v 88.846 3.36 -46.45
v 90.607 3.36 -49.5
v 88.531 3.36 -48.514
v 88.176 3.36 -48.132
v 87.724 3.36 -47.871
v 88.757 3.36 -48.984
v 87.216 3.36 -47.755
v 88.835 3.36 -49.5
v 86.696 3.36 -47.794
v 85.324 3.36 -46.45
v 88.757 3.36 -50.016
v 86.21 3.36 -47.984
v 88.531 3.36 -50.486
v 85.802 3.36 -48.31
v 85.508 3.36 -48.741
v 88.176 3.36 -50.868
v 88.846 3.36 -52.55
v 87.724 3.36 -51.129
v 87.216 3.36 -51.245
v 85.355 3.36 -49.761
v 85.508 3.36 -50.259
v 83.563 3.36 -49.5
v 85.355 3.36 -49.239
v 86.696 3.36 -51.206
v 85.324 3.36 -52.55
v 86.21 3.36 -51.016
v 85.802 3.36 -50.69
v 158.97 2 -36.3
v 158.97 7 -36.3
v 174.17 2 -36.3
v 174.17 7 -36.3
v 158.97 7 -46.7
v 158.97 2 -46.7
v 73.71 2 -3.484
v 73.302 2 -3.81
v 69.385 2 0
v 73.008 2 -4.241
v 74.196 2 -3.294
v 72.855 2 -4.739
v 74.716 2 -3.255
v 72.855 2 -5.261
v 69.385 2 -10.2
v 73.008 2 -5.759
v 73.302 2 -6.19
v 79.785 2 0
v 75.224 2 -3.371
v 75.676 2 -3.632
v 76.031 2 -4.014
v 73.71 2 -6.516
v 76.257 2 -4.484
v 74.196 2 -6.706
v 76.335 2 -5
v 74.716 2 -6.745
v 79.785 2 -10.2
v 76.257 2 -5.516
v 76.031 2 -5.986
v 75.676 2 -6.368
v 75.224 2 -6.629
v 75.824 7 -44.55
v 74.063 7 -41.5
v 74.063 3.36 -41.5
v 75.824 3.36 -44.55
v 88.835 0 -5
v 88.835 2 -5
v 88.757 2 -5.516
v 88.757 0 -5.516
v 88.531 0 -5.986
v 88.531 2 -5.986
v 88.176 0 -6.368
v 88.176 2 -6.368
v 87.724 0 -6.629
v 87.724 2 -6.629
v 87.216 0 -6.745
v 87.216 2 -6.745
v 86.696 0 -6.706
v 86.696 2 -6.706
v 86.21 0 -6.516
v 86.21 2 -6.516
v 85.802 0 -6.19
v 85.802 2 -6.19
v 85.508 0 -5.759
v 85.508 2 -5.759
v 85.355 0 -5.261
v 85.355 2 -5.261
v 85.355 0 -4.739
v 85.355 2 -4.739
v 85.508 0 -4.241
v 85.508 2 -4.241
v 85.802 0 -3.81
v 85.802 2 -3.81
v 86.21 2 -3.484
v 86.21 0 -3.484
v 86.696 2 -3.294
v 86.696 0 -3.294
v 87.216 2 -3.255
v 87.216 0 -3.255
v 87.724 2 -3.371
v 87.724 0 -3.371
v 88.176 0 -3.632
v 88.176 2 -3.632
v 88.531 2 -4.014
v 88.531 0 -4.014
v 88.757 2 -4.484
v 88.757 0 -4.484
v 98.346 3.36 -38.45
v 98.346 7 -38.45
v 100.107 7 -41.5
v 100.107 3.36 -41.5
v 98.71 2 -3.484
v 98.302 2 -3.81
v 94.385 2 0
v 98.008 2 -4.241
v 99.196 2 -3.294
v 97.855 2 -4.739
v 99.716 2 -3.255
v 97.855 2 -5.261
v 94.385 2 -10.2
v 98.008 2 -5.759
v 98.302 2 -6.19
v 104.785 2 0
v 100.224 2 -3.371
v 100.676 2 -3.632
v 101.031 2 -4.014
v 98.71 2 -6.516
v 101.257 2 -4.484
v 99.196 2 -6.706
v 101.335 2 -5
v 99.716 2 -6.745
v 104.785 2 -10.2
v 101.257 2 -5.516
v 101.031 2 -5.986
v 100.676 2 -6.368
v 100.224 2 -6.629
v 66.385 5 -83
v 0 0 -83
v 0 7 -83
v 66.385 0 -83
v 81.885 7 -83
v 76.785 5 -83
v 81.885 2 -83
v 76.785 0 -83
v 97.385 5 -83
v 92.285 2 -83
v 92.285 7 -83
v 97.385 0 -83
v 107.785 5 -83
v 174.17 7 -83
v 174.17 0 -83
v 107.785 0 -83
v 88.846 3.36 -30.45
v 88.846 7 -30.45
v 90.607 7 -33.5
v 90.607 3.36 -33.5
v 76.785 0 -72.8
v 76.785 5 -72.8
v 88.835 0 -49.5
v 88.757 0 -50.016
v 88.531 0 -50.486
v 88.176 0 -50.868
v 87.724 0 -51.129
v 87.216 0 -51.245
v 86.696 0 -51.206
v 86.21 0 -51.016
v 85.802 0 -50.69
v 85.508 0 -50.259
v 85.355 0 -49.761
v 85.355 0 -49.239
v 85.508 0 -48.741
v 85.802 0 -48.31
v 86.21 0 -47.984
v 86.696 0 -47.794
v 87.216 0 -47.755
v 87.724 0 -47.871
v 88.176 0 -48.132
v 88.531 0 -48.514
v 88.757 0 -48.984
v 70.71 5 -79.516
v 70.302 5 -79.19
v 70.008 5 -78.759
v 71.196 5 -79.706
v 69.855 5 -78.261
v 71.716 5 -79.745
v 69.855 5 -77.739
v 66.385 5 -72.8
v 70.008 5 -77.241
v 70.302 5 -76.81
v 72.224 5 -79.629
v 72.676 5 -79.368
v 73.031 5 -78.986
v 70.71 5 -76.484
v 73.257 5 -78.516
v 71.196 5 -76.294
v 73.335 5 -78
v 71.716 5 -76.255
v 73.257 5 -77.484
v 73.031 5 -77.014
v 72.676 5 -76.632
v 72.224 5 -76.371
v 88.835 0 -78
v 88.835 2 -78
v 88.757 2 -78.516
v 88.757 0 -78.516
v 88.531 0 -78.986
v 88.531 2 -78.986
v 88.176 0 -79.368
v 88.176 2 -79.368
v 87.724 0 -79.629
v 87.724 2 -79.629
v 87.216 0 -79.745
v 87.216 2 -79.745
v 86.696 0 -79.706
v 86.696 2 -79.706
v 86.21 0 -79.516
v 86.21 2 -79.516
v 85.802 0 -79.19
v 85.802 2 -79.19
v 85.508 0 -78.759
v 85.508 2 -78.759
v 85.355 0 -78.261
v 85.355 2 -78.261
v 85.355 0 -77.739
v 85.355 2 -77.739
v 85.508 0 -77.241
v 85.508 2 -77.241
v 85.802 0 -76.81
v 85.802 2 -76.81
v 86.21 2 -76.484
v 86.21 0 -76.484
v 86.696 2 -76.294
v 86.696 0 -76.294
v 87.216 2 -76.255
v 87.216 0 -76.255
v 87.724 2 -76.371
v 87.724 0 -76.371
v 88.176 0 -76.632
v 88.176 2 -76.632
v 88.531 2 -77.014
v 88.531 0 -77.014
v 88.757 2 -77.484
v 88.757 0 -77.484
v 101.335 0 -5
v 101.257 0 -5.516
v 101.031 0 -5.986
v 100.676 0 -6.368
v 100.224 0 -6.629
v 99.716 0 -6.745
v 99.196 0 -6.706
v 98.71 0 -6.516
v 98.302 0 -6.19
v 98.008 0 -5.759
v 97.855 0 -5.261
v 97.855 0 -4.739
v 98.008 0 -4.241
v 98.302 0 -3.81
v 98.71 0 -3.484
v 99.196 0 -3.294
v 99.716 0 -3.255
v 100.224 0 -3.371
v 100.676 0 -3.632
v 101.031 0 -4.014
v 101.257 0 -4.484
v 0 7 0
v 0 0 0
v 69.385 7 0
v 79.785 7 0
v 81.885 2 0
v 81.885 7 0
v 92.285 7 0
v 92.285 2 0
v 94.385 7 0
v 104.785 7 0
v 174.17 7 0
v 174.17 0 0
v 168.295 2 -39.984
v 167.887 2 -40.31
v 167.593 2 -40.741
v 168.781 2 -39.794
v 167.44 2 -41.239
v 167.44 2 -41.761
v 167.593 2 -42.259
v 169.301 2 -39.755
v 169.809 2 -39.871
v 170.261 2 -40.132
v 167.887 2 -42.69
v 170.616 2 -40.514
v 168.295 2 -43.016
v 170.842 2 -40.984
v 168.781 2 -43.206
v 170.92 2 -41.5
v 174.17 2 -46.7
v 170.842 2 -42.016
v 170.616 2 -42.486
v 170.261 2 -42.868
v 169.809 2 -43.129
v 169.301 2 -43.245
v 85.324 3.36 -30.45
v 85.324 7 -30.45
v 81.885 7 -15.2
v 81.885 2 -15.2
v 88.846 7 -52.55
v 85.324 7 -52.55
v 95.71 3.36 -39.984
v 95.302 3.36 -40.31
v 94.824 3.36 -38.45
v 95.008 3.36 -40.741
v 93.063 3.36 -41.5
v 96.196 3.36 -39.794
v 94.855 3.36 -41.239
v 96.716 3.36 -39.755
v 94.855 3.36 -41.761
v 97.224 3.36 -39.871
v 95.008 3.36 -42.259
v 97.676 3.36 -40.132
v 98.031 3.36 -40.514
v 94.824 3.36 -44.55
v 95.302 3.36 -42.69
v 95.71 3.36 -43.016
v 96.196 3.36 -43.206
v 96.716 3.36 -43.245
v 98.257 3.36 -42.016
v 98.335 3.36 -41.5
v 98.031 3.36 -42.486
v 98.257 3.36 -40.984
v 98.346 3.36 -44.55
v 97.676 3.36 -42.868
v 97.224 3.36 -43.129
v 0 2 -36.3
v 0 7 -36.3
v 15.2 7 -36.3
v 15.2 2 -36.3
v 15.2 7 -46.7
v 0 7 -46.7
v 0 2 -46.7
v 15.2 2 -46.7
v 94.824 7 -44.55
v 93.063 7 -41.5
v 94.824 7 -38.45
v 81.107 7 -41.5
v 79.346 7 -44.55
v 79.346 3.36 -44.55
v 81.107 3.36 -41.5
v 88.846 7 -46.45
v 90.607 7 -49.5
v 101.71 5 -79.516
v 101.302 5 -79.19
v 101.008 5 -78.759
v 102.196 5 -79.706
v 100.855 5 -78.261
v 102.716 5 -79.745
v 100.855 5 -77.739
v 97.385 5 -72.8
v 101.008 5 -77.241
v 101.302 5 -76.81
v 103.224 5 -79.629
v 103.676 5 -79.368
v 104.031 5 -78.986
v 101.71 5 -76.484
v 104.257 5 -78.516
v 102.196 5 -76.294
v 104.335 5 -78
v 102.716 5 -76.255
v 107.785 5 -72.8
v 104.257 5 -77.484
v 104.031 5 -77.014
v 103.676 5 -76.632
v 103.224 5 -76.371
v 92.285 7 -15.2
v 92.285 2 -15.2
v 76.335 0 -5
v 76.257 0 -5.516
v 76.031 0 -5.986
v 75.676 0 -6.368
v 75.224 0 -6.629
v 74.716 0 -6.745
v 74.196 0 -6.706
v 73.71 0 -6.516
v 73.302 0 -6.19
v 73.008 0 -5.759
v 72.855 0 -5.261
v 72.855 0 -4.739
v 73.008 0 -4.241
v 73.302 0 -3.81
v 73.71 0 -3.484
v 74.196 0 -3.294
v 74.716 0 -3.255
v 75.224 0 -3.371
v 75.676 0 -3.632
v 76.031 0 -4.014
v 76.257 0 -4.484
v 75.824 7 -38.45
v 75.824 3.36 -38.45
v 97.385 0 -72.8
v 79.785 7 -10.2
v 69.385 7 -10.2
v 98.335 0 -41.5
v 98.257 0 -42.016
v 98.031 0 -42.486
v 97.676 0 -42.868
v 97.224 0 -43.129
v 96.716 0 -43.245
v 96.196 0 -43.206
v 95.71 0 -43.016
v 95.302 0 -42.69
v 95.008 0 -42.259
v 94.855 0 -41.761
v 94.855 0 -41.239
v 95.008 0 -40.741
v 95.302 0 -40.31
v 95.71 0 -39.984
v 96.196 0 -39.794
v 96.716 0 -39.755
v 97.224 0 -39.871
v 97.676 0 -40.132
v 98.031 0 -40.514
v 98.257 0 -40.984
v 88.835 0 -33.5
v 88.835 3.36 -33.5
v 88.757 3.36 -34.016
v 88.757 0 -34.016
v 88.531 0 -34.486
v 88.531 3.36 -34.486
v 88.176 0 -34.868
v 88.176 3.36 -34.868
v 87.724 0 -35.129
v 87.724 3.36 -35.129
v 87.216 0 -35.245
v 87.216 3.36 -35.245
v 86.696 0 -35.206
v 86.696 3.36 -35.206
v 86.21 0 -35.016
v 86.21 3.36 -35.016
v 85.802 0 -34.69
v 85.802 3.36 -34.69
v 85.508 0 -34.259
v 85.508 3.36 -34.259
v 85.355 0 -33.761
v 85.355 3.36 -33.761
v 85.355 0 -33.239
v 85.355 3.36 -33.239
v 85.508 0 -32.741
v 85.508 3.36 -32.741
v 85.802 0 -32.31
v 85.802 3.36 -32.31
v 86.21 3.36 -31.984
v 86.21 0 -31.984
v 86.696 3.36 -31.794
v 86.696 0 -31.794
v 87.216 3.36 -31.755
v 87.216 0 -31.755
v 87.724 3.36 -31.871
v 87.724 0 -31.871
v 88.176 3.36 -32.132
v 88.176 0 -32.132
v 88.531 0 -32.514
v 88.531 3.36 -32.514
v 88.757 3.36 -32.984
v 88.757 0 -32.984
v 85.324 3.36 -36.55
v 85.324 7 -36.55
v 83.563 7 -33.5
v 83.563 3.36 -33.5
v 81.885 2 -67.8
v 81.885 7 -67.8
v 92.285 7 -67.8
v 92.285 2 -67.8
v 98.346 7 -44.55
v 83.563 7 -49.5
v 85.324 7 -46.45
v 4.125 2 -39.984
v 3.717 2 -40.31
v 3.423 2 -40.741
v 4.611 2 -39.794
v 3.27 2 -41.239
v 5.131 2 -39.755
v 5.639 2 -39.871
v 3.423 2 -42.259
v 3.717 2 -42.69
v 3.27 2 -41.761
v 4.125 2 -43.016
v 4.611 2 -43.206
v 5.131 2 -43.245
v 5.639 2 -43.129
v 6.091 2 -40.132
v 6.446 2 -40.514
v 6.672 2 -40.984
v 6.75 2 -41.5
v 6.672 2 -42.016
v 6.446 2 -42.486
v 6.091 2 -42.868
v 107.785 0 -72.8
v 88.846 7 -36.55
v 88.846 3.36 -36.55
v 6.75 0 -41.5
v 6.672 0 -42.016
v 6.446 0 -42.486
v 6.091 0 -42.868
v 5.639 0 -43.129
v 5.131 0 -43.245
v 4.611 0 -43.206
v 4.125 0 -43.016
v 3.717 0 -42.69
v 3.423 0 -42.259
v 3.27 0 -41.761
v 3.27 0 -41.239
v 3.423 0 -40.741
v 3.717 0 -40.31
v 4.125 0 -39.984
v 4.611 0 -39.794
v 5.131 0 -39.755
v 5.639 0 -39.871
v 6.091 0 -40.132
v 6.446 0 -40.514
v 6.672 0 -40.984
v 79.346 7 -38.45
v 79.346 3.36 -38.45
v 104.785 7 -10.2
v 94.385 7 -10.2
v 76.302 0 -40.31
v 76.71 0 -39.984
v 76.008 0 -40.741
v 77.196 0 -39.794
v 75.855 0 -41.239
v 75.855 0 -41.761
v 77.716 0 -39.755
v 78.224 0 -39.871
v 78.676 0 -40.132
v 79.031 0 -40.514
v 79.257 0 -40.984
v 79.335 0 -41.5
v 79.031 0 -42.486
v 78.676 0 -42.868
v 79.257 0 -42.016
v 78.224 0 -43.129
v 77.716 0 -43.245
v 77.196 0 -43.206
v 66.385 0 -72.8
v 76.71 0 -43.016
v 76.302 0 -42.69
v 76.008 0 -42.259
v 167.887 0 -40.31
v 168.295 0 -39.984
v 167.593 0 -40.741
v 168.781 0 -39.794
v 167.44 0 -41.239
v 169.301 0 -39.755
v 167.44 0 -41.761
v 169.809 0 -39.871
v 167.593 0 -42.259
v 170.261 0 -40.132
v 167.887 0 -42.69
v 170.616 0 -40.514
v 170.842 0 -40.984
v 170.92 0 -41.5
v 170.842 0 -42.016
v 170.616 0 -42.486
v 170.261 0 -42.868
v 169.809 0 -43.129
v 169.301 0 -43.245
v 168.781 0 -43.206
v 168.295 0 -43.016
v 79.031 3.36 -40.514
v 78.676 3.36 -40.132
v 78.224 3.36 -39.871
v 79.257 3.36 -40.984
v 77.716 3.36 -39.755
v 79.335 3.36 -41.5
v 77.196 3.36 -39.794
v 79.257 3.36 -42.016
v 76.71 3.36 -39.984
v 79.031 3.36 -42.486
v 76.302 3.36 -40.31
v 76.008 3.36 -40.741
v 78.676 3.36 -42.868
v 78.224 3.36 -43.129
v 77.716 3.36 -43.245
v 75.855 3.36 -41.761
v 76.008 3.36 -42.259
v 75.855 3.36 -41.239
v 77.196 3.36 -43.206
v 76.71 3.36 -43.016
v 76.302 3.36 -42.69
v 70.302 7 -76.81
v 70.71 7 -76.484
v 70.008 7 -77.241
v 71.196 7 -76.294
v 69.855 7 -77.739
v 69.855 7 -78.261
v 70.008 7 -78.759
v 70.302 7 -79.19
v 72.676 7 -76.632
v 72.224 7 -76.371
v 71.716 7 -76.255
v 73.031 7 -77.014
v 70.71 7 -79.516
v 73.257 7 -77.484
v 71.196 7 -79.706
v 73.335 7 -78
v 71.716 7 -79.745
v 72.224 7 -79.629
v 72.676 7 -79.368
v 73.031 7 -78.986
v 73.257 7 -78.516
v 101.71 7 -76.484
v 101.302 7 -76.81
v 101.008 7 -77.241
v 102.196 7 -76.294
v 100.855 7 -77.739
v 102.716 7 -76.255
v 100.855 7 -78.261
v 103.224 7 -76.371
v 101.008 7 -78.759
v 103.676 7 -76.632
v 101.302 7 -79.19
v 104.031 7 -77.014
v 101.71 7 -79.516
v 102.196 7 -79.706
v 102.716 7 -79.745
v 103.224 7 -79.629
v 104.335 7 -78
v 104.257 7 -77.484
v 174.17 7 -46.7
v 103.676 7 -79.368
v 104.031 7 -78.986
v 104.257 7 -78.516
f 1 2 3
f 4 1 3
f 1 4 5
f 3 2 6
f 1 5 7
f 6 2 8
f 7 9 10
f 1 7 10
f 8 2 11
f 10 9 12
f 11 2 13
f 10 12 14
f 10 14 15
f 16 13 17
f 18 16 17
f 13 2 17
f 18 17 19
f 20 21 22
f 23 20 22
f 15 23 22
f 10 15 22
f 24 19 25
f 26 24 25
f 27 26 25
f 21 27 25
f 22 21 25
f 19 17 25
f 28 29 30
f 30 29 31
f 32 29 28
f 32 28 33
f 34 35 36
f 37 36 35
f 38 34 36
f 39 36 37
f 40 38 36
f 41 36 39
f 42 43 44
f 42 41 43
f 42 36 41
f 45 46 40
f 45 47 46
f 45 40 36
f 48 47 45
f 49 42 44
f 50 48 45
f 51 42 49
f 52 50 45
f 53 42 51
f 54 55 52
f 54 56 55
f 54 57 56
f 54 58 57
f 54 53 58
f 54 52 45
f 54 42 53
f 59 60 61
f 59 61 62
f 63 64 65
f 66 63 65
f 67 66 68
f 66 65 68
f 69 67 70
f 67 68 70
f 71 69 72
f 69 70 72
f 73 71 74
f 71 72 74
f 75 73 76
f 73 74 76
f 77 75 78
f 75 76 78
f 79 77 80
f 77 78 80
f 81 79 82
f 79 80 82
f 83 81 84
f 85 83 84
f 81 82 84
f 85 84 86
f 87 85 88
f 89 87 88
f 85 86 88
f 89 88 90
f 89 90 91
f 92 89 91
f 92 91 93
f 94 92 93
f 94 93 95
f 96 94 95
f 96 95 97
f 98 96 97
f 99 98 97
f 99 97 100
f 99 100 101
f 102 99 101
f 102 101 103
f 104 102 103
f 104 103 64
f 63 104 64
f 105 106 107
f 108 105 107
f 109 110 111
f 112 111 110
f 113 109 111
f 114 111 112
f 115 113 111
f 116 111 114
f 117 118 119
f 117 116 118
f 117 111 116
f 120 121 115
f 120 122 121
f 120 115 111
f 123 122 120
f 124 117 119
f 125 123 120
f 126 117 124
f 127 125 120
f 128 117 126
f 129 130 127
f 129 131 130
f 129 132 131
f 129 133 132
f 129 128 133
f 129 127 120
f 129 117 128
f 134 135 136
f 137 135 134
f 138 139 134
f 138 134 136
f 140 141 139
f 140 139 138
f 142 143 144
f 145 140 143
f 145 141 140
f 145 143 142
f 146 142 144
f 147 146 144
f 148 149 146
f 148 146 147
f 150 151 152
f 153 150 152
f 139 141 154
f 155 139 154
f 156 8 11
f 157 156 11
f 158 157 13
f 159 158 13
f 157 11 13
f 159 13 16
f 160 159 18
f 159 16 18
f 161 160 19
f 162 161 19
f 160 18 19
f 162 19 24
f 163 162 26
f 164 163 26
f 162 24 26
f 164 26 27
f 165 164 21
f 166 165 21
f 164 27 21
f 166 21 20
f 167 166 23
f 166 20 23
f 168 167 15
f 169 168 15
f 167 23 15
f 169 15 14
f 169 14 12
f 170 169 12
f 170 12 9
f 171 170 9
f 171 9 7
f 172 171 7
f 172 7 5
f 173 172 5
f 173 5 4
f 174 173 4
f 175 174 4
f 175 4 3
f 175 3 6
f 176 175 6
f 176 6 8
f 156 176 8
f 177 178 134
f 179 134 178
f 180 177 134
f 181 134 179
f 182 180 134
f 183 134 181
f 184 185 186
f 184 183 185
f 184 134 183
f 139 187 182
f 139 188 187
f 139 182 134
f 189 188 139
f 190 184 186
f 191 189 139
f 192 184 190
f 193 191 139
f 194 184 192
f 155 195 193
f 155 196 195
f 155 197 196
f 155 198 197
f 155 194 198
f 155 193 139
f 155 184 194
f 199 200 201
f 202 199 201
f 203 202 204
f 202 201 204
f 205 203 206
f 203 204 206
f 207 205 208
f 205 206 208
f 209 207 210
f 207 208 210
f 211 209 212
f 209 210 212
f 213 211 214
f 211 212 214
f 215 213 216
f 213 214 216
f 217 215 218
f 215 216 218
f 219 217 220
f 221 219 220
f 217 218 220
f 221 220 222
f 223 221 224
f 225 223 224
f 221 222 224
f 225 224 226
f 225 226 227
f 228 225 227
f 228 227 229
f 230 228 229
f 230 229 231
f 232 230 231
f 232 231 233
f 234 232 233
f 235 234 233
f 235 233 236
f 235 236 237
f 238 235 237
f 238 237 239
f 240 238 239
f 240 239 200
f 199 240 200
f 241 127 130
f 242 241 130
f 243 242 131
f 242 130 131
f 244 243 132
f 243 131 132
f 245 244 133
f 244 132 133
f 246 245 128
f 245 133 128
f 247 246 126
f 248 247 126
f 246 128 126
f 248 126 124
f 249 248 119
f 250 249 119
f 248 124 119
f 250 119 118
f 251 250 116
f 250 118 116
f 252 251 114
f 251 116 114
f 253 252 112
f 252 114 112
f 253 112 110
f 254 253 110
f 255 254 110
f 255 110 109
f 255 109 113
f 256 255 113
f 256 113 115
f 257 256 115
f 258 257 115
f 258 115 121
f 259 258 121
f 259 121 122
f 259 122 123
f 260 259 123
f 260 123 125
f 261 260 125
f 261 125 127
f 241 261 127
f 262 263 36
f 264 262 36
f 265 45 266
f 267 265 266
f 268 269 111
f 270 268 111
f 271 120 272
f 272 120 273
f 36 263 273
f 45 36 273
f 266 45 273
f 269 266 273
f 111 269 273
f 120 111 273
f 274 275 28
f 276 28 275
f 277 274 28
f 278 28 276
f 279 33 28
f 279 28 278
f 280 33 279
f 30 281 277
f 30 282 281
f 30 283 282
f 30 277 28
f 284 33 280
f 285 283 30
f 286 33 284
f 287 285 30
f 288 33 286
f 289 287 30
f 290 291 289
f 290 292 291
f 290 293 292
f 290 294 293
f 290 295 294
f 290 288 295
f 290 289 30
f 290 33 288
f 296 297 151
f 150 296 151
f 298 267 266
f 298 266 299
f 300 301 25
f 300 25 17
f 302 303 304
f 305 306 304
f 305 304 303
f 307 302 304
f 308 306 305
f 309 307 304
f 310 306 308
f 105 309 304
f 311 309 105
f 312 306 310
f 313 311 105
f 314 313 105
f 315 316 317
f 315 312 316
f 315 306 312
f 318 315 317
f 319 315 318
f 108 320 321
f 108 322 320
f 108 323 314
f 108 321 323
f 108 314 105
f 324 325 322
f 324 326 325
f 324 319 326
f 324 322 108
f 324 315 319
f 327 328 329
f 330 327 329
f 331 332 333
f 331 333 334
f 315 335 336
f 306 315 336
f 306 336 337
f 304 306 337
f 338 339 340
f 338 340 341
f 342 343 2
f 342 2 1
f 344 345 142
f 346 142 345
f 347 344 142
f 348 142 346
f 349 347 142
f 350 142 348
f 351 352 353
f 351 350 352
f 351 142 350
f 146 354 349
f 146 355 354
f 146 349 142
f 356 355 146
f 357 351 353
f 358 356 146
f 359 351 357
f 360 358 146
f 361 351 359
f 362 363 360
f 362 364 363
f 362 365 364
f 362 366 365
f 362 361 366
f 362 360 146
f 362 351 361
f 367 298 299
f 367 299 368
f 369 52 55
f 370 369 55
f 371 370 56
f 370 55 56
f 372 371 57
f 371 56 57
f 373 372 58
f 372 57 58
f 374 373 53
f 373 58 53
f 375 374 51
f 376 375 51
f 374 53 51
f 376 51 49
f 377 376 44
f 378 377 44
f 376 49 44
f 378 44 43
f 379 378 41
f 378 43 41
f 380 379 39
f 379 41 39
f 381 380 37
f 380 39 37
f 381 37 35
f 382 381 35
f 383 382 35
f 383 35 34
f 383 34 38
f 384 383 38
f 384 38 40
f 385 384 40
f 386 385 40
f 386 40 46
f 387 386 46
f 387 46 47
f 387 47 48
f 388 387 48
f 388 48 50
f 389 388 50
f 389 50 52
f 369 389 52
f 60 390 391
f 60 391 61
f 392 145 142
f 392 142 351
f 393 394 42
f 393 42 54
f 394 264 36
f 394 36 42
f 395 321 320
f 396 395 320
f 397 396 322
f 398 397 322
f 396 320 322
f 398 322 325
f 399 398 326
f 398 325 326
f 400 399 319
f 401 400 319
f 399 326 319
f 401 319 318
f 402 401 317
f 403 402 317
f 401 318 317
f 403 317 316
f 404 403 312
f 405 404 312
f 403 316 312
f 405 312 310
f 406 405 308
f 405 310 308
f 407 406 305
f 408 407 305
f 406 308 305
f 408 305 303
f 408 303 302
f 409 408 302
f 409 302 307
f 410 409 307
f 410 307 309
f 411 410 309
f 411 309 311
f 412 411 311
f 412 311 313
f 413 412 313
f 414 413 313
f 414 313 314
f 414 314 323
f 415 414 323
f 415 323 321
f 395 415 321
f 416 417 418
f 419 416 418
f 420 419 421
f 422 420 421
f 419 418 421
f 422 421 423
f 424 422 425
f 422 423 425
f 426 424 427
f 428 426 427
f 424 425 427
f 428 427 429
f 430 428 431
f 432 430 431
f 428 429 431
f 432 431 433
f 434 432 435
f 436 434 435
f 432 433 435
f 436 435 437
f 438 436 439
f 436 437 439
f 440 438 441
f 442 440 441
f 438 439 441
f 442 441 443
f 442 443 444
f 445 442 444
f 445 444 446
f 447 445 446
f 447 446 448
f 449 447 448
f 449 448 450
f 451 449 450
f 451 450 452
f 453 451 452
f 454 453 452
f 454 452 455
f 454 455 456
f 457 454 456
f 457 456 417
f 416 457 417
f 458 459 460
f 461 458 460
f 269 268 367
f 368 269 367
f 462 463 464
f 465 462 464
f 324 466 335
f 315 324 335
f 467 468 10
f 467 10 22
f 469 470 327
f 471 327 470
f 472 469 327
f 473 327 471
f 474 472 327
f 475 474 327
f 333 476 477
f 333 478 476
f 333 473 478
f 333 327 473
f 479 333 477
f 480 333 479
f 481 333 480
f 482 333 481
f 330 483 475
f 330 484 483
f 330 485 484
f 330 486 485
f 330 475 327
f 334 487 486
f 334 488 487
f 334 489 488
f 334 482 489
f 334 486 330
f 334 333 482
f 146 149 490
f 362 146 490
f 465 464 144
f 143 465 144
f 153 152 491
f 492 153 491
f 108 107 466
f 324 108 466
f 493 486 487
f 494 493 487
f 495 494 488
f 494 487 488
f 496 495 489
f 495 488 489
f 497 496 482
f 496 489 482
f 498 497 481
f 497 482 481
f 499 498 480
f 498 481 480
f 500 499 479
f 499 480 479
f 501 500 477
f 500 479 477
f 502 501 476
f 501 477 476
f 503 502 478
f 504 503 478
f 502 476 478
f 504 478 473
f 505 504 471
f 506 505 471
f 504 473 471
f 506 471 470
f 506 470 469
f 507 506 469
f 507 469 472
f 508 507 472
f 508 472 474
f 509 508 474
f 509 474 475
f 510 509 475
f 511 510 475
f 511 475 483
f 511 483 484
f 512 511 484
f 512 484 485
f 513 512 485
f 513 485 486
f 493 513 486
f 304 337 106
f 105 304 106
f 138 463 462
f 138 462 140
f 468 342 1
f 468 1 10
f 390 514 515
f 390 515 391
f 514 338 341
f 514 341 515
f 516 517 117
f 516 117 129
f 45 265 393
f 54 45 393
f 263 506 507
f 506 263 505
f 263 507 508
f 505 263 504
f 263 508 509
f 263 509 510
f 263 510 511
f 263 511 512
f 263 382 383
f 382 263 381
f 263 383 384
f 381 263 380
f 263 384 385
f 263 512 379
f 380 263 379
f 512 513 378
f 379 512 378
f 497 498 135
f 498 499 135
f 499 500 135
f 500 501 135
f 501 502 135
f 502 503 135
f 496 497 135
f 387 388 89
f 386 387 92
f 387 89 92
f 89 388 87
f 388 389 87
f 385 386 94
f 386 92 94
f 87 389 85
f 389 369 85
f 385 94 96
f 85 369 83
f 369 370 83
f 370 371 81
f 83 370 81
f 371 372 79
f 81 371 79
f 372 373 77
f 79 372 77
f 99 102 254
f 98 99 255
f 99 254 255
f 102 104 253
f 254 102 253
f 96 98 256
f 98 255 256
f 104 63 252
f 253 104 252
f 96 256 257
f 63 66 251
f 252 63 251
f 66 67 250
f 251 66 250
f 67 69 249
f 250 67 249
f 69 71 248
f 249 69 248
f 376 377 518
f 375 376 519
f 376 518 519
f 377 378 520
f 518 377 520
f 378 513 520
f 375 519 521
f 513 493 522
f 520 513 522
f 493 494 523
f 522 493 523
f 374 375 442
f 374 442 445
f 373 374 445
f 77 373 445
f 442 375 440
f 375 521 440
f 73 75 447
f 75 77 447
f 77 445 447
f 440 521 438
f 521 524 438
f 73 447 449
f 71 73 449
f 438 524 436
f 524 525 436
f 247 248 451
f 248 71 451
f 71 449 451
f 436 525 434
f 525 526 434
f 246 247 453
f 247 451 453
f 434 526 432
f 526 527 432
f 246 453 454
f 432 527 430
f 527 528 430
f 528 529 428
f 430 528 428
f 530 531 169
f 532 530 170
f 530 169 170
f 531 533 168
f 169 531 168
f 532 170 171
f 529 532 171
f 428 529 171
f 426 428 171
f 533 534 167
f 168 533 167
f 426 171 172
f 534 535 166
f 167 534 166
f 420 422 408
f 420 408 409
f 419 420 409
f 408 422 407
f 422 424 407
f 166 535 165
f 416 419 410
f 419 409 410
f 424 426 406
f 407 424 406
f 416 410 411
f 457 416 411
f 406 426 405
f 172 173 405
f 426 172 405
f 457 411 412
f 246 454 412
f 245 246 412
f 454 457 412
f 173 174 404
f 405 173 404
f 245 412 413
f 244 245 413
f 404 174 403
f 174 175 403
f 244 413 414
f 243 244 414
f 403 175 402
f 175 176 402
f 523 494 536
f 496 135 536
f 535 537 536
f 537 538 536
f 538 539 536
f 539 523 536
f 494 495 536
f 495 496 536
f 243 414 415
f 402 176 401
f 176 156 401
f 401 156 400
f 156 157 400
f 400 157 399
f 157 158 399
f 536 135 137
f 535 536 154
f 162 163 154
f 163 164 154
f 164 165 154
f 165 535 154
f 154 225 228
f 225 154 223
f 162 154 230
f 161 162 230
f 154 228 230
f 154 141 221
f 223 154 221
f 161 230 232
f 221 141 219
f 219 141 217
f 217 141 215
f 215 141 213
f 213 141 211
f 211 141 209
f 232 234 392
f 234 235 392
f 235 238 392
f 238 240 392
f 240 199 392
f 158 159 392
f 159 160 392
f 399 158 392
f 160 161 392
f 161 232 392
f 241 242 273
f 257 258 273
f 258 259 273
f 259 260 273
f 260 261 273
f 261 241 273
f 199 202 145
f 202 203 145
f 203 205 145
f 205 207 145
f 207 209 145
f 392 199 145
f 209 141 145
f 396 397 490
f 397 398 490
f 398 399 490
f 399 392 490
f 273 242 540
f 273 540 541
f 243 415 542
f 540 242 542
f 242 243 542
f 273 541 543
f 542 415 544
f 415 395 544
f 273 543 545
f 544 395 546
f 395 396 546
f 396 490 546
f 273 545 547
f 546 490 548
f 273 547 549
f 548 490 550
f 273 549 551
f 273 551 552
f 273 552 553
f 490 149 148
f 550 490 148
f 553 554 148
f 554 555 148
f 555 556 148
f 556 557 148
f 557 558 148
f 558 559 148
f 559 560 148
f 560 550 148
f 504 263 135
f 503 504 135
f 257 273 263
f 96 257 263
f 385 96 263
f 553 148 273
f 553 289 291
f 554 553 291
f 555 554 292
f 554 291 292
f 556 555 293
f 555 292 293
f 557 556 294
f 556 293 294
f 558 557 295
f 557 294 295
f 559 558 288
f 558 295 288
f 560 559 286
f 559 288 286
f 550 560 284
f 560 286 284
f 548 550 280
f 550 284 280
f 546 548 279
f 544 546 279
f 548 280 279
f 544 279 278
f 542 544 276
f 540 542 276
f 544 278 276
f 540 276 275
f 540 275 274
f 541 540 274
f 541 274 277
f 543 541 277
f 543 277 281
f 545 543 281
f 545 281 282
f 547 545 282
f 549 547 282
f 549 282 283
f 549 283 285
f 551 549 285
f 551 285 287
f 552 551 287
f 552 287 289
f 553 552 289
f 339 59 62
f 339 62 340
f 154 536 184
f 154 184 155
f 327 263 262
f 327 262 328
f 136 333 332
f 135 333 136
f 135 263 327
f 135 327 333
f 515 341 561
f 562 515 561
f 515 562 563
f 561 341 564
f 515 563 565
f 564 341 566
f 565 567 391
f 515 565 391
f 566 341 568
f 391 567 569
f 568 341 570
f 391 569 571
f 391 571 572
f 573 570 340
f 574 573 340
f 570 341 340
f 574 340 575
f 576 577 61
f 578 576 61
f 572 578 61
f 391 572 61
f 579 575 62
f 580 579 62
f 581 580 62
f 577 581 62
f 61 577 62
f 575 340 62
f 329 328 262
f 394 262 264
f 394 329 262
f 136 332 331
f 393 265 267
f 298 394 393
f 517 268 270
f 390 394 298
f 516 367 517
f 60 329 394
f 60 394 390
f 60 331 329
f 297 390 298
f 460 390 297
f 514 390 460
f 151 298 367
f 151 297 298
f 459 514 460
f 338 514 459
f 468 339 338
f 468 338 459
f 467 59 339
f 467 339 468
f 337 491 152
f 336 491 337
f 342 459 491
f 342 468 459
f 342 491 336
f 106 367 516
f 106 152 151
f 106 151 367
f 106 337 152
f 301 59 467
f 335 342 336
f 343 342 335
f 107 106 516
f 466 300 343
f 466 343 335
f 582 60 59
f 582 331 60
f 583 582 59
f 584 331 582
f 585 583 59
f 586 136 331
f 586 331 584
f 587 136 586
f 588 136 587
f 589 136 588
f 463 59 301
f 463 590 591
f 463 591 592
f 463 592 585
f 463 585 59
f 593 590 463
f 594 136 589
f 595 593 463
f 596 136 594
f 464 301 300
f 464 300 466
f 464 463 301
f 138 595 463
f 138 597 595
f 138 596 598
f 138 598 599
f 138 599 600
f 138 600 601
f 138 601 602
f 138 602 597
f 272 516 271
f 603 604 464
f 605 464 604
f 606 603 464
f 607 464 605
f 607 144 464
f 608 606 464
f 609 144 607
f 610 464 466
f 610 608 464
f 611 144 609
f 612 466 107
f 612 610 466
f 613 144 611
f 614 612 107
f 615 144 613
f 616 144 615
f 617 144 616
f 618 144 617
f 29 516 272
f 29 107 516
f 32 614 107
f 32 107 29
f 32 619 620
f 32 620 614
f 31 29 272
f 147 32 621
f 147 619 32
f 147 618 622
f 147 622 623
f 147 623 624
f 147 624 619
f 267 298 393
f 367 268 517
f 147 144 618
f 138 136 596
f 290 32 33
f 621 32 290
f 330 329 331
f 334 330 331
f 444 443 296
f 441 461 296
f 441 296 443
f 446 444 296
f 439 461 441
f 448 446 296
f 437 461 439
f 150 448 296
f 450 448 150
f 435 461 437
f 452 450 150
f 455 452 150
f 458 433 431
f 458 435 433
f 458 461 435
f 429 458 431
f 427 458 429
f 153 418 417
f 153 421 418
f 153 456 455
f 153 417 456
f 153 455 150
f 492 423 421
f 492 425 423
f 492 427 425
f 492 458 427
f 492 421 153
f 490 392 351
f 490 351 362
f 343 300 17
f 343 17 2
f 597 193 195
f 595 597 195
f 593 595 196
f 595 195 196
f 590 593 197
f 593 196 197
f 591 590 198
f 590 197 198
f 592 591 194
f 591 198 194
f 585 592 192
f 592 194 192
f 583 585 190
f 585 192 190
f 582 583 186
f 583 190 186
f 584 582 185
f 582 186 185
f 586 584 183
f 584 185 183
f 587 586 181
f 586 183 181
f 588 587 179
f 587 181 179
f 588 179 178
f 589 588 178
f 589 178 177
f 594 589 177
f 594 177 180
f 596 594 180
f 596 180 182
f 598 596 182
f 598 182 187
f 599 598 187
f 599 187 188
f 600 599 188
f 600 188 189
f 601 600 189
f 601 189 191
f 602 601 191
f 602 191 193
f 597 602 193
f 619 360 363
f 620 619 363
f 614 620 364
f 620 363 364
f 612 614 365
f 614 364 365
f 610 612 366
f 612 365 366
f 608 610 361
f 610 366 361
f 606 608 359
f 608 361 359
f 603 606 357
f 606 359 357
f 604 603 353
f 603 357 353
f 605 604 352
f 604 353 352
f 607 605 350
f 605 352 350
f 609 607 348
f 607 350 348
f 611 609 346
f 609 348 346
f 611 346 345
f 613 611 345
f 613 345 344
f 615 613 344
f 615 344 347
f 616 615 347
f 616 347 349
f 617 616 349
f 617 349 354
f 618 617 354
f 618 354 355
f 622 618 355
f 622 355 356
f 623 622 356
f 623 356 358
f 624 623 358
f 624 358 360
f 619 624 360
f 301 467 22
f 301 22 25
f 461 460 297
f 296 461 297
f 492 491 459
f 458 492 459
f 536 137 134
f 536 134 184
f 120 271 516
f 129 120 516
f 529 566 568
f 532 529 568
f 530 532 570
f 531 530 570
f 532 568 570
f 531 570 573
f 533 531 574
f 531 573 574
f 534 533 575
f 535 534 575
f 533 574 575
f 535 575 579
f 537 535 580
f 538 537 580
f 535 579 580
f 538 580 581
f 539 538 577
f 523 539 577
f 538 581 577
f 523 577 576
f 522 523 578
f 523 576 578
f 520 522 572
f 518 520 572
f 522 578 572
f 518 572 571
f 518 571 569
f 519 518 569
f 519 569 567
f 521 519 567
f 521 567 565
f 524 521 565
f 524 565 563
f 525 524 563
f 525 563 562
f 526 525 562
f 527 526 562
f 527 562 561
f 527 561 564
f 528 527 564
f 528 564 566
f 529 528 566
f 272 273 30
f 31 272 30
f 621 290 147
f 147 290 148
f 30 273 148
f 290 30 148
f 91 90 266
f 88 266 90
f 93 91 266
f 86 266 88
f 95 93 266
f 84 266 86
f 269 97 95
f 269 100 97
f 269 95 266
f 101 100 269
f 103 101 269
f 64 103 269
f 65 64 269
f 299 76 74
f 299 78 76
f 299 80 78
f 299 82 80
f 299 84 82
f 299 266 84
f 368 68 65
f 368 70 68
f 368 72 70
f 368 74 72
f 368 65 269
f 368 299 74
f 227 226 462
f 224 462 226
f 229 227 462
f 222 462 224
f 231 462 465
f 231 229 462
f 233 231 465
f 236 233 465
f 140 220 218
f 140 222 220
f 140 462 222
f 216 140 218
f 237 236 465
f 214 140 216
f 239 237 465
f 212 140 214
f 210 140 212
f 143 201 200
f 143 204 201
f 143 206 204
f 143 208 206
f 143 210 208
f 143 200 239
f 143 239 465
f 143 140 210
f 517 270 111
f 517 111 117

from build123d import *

# Parameters (mm, degrees)
SKETCH1_W           = 174.17
SKETCH1_H           = 83
BOSS_EXTRUDE1_DEPTH = 7
SKETCH2_R           = 1.75
CUT_EXTRUDE1_DEPTH  = 8
SKETCH3_R           = 1.75
CUT_EXTRUDE2_DEPTH  = 8
SKETCH4_W           = 15.4
SKETCH4_H           = 10.4
SKETCH4_W_2         = 10.4
SKETCH4_H_2         = 15.4
CUT_EXTRUDE3_DEPTH  = 5
SKETCH5_W           = 10.4
SKETCH5_H           = 10.4
CUT_EXTRUDE4_DEPTH  = 5
SKETCH6_R           = 1.75
CUT_EXTRUDE5_DEPTH  = 3
CUT_EXTRUDE6_DEPTH  = 3.64
SKETCH9_W           = 10.4
SKETCH9_H           = 10.4
CUT_EXTRUDE7_DEPTH  = 5
SKETCH10_R          = 1.75
CUT_EXTRUDE8_DEPTH  = 3


with BuildPart() as part:
    # Sketch1 → Boss-Extrude1 (new body)
    with BuildSketch(Plane(origin=(0, 0, 0), x_dir=(1, 0, 0), z_dir=(0, 1, 0))):
        with Locations((87.085, 41.5)):
            Rectangle(SKETCH1_W, SKETCH1_H)
    extrude(amount=BOSS_EXTRUDE1_DEPTH)

    # Sketch2 → Cut-Extrude1 (cut, through all)
    with BuildSketch(Plane(origin=(0, 7, 0), x_dir=(1, 0, 0), z_dir=(0, 1, 0))):
        with Locations((87.085, 49.5)):
            Circle(SKETCH2_R)
        with Locations((77.585, 41.5)):
            Circle(SKETCH2_R)
        with Locations((96.585, 41.5)):
            Circle(SKETCH2_R)
        with Locations((87.085, 33.5)):
            Circle(SKETCH2_R)
    extrude(amount=-CUT_EXTRUDE1_DEPTH, mode=Mode.SUBTRACT)

    # Sketch3 → Cut-Extrude2 (cut, through all)
    with BuildSketch(Plane(origin=(0, 7, 0), x_dir=(1, 0, 0), z_dir=(0, 1, 0))):
        with Locations((87.085, 78)):
            Circle(SKETCH3_R)
        with Locations((5, 41.5)):
            Circle(SKETCH3_R)
        with Locations((87.085, 5)):
            Circle(SKETCH3_R)
        with Locations((169.17, 41.5)):
            Circle(SKETCH3_R)
    extrude(amount=-CUT_EXTRUDE2_DEPTH, mode=Mode.SUBTRACT)

    # Sketch4 → Cut-Extrude3 (cut)
    with BuildSketch(Plane(origin=(0, 7, 0), x_dir=(1, 0, 0), z_dir=(0, 1, 0))):
        with Locations((7.5, 41.5)):
            Rectangle(SKETCH4_W, SKETCH4_H)
        with Locations((87.085, 7.5)):
            Rectangle(SKETCH4_W_2, SKETCH4_H_2)
        with Locations((87.085, 75.5)):
            Rectangle(SKETCH4_W_2, SKETCH4_H_2)
        with Locations((166.67, 41.5)):
            Rectangle(SKETCH4_W, SKETCH4_H)
    extrude(amount=-CUT_EXTRUDE3_DEPTH, mode=Mode.SUBTRACT)

    # Sketch5 → Cut-Extrude4 (cut)
    with BuildSketch(Plane(origin=(0, 7, 0), x_dir=(1, 0, 0), z_dir=(0, 1, 0))):
        with Locations((74.585, 5)):
            Rectangle(SKETCH5_W, SKETCH5_H)
        with Locations((99.585, 5)):
            Rectangle(SKETCH5_W, SKETCH5_H)
    extrude(amount=-CUT_EXTRUDE4_DEPTH, mode=Mode.SUBTRACT)

    # Sketch6 → Cut-Extrude5 (cut, through all)
    with BuildSketch(Plane(origin=(0, 2, 0), x_dir=(1, 0, 0), z_dir=(0, 1, 0))):
        with Locations((74.585, 5)):
            Circle(SKETCH6_R)
        with Locations((99.585, 5)):
            Circle(SKETCH6_R)
    extrude(amount=-CUT_EXTRUDE5_DEPTH, mode=Mode.SUBTRACT)

    # Sketch7 → Cut-Extrude6 (cut)
    with BuildSketch(Plane(origin=(0, 7, 0), x_dir=(1, 0, 0), z_dir=(0, 1, 0))):
        Polygon((75.824081679, 44.55), (79.345918321, 44.55), (81.106836642, 41.5), (79.345918321, 38.45), (75.824081679, 38.45), (74.063163358, 41.5), align=None)
        Polygon((85.324081679, 52.55), (88.845918321, 52.55), (90.606836642, 49.5), (88.845918321, 46.45), (85.324081679, 46.45), (83.563163358, 49.5), align=None)
        Polygon((100.106836642, 41.5), (98.345918321, 44.55), (94.824081679, 44.55), (93.063163358, 41.5), (94.824081679, 38.45), (98.345918321, 38.45), align=None)
        Polygon((83.563163358, 33.5), (85.324081679, 30.45), (88.845918321, 30.45), (90.606836642, 33.5), (88.845918321, 36.55), (85.324081679, 36.55), align=None)
    extrude(amount=-CUT_EXTRUDE6_DEPTH, mode=Mode.SUBTRACT)

    # Sketch9 → Cut-Extrude7 (cut)
    with BuildSketch(Plane.XZ):
        with Locations((71.585, -78)):
            Rectangle(SKETCH9_W, SKETCH9_H)
        with Locations((102.585, -78)):
            Rectangle(SKETCH9_W, SKETCH9_H)
    extrude(amount=-CUT_EXTRUDE7_DEPTH, mode=Mode.SUBTRACT)

    # Sketch10 → Cut-Extrude8 (cut, through all)
    with BuildSketch(Plane.XZ.offset(-5)):
        with Locations((71.585, -78)):
            Circle(SKETCH10_R)
        with Locations((102.585, -78)):
            Circle(SKETCH10_R)
    extrude(amount=-CUT_EXTRUDE8_DEPTH, mode=Mode.SUBTRACT)


solid = part.part
